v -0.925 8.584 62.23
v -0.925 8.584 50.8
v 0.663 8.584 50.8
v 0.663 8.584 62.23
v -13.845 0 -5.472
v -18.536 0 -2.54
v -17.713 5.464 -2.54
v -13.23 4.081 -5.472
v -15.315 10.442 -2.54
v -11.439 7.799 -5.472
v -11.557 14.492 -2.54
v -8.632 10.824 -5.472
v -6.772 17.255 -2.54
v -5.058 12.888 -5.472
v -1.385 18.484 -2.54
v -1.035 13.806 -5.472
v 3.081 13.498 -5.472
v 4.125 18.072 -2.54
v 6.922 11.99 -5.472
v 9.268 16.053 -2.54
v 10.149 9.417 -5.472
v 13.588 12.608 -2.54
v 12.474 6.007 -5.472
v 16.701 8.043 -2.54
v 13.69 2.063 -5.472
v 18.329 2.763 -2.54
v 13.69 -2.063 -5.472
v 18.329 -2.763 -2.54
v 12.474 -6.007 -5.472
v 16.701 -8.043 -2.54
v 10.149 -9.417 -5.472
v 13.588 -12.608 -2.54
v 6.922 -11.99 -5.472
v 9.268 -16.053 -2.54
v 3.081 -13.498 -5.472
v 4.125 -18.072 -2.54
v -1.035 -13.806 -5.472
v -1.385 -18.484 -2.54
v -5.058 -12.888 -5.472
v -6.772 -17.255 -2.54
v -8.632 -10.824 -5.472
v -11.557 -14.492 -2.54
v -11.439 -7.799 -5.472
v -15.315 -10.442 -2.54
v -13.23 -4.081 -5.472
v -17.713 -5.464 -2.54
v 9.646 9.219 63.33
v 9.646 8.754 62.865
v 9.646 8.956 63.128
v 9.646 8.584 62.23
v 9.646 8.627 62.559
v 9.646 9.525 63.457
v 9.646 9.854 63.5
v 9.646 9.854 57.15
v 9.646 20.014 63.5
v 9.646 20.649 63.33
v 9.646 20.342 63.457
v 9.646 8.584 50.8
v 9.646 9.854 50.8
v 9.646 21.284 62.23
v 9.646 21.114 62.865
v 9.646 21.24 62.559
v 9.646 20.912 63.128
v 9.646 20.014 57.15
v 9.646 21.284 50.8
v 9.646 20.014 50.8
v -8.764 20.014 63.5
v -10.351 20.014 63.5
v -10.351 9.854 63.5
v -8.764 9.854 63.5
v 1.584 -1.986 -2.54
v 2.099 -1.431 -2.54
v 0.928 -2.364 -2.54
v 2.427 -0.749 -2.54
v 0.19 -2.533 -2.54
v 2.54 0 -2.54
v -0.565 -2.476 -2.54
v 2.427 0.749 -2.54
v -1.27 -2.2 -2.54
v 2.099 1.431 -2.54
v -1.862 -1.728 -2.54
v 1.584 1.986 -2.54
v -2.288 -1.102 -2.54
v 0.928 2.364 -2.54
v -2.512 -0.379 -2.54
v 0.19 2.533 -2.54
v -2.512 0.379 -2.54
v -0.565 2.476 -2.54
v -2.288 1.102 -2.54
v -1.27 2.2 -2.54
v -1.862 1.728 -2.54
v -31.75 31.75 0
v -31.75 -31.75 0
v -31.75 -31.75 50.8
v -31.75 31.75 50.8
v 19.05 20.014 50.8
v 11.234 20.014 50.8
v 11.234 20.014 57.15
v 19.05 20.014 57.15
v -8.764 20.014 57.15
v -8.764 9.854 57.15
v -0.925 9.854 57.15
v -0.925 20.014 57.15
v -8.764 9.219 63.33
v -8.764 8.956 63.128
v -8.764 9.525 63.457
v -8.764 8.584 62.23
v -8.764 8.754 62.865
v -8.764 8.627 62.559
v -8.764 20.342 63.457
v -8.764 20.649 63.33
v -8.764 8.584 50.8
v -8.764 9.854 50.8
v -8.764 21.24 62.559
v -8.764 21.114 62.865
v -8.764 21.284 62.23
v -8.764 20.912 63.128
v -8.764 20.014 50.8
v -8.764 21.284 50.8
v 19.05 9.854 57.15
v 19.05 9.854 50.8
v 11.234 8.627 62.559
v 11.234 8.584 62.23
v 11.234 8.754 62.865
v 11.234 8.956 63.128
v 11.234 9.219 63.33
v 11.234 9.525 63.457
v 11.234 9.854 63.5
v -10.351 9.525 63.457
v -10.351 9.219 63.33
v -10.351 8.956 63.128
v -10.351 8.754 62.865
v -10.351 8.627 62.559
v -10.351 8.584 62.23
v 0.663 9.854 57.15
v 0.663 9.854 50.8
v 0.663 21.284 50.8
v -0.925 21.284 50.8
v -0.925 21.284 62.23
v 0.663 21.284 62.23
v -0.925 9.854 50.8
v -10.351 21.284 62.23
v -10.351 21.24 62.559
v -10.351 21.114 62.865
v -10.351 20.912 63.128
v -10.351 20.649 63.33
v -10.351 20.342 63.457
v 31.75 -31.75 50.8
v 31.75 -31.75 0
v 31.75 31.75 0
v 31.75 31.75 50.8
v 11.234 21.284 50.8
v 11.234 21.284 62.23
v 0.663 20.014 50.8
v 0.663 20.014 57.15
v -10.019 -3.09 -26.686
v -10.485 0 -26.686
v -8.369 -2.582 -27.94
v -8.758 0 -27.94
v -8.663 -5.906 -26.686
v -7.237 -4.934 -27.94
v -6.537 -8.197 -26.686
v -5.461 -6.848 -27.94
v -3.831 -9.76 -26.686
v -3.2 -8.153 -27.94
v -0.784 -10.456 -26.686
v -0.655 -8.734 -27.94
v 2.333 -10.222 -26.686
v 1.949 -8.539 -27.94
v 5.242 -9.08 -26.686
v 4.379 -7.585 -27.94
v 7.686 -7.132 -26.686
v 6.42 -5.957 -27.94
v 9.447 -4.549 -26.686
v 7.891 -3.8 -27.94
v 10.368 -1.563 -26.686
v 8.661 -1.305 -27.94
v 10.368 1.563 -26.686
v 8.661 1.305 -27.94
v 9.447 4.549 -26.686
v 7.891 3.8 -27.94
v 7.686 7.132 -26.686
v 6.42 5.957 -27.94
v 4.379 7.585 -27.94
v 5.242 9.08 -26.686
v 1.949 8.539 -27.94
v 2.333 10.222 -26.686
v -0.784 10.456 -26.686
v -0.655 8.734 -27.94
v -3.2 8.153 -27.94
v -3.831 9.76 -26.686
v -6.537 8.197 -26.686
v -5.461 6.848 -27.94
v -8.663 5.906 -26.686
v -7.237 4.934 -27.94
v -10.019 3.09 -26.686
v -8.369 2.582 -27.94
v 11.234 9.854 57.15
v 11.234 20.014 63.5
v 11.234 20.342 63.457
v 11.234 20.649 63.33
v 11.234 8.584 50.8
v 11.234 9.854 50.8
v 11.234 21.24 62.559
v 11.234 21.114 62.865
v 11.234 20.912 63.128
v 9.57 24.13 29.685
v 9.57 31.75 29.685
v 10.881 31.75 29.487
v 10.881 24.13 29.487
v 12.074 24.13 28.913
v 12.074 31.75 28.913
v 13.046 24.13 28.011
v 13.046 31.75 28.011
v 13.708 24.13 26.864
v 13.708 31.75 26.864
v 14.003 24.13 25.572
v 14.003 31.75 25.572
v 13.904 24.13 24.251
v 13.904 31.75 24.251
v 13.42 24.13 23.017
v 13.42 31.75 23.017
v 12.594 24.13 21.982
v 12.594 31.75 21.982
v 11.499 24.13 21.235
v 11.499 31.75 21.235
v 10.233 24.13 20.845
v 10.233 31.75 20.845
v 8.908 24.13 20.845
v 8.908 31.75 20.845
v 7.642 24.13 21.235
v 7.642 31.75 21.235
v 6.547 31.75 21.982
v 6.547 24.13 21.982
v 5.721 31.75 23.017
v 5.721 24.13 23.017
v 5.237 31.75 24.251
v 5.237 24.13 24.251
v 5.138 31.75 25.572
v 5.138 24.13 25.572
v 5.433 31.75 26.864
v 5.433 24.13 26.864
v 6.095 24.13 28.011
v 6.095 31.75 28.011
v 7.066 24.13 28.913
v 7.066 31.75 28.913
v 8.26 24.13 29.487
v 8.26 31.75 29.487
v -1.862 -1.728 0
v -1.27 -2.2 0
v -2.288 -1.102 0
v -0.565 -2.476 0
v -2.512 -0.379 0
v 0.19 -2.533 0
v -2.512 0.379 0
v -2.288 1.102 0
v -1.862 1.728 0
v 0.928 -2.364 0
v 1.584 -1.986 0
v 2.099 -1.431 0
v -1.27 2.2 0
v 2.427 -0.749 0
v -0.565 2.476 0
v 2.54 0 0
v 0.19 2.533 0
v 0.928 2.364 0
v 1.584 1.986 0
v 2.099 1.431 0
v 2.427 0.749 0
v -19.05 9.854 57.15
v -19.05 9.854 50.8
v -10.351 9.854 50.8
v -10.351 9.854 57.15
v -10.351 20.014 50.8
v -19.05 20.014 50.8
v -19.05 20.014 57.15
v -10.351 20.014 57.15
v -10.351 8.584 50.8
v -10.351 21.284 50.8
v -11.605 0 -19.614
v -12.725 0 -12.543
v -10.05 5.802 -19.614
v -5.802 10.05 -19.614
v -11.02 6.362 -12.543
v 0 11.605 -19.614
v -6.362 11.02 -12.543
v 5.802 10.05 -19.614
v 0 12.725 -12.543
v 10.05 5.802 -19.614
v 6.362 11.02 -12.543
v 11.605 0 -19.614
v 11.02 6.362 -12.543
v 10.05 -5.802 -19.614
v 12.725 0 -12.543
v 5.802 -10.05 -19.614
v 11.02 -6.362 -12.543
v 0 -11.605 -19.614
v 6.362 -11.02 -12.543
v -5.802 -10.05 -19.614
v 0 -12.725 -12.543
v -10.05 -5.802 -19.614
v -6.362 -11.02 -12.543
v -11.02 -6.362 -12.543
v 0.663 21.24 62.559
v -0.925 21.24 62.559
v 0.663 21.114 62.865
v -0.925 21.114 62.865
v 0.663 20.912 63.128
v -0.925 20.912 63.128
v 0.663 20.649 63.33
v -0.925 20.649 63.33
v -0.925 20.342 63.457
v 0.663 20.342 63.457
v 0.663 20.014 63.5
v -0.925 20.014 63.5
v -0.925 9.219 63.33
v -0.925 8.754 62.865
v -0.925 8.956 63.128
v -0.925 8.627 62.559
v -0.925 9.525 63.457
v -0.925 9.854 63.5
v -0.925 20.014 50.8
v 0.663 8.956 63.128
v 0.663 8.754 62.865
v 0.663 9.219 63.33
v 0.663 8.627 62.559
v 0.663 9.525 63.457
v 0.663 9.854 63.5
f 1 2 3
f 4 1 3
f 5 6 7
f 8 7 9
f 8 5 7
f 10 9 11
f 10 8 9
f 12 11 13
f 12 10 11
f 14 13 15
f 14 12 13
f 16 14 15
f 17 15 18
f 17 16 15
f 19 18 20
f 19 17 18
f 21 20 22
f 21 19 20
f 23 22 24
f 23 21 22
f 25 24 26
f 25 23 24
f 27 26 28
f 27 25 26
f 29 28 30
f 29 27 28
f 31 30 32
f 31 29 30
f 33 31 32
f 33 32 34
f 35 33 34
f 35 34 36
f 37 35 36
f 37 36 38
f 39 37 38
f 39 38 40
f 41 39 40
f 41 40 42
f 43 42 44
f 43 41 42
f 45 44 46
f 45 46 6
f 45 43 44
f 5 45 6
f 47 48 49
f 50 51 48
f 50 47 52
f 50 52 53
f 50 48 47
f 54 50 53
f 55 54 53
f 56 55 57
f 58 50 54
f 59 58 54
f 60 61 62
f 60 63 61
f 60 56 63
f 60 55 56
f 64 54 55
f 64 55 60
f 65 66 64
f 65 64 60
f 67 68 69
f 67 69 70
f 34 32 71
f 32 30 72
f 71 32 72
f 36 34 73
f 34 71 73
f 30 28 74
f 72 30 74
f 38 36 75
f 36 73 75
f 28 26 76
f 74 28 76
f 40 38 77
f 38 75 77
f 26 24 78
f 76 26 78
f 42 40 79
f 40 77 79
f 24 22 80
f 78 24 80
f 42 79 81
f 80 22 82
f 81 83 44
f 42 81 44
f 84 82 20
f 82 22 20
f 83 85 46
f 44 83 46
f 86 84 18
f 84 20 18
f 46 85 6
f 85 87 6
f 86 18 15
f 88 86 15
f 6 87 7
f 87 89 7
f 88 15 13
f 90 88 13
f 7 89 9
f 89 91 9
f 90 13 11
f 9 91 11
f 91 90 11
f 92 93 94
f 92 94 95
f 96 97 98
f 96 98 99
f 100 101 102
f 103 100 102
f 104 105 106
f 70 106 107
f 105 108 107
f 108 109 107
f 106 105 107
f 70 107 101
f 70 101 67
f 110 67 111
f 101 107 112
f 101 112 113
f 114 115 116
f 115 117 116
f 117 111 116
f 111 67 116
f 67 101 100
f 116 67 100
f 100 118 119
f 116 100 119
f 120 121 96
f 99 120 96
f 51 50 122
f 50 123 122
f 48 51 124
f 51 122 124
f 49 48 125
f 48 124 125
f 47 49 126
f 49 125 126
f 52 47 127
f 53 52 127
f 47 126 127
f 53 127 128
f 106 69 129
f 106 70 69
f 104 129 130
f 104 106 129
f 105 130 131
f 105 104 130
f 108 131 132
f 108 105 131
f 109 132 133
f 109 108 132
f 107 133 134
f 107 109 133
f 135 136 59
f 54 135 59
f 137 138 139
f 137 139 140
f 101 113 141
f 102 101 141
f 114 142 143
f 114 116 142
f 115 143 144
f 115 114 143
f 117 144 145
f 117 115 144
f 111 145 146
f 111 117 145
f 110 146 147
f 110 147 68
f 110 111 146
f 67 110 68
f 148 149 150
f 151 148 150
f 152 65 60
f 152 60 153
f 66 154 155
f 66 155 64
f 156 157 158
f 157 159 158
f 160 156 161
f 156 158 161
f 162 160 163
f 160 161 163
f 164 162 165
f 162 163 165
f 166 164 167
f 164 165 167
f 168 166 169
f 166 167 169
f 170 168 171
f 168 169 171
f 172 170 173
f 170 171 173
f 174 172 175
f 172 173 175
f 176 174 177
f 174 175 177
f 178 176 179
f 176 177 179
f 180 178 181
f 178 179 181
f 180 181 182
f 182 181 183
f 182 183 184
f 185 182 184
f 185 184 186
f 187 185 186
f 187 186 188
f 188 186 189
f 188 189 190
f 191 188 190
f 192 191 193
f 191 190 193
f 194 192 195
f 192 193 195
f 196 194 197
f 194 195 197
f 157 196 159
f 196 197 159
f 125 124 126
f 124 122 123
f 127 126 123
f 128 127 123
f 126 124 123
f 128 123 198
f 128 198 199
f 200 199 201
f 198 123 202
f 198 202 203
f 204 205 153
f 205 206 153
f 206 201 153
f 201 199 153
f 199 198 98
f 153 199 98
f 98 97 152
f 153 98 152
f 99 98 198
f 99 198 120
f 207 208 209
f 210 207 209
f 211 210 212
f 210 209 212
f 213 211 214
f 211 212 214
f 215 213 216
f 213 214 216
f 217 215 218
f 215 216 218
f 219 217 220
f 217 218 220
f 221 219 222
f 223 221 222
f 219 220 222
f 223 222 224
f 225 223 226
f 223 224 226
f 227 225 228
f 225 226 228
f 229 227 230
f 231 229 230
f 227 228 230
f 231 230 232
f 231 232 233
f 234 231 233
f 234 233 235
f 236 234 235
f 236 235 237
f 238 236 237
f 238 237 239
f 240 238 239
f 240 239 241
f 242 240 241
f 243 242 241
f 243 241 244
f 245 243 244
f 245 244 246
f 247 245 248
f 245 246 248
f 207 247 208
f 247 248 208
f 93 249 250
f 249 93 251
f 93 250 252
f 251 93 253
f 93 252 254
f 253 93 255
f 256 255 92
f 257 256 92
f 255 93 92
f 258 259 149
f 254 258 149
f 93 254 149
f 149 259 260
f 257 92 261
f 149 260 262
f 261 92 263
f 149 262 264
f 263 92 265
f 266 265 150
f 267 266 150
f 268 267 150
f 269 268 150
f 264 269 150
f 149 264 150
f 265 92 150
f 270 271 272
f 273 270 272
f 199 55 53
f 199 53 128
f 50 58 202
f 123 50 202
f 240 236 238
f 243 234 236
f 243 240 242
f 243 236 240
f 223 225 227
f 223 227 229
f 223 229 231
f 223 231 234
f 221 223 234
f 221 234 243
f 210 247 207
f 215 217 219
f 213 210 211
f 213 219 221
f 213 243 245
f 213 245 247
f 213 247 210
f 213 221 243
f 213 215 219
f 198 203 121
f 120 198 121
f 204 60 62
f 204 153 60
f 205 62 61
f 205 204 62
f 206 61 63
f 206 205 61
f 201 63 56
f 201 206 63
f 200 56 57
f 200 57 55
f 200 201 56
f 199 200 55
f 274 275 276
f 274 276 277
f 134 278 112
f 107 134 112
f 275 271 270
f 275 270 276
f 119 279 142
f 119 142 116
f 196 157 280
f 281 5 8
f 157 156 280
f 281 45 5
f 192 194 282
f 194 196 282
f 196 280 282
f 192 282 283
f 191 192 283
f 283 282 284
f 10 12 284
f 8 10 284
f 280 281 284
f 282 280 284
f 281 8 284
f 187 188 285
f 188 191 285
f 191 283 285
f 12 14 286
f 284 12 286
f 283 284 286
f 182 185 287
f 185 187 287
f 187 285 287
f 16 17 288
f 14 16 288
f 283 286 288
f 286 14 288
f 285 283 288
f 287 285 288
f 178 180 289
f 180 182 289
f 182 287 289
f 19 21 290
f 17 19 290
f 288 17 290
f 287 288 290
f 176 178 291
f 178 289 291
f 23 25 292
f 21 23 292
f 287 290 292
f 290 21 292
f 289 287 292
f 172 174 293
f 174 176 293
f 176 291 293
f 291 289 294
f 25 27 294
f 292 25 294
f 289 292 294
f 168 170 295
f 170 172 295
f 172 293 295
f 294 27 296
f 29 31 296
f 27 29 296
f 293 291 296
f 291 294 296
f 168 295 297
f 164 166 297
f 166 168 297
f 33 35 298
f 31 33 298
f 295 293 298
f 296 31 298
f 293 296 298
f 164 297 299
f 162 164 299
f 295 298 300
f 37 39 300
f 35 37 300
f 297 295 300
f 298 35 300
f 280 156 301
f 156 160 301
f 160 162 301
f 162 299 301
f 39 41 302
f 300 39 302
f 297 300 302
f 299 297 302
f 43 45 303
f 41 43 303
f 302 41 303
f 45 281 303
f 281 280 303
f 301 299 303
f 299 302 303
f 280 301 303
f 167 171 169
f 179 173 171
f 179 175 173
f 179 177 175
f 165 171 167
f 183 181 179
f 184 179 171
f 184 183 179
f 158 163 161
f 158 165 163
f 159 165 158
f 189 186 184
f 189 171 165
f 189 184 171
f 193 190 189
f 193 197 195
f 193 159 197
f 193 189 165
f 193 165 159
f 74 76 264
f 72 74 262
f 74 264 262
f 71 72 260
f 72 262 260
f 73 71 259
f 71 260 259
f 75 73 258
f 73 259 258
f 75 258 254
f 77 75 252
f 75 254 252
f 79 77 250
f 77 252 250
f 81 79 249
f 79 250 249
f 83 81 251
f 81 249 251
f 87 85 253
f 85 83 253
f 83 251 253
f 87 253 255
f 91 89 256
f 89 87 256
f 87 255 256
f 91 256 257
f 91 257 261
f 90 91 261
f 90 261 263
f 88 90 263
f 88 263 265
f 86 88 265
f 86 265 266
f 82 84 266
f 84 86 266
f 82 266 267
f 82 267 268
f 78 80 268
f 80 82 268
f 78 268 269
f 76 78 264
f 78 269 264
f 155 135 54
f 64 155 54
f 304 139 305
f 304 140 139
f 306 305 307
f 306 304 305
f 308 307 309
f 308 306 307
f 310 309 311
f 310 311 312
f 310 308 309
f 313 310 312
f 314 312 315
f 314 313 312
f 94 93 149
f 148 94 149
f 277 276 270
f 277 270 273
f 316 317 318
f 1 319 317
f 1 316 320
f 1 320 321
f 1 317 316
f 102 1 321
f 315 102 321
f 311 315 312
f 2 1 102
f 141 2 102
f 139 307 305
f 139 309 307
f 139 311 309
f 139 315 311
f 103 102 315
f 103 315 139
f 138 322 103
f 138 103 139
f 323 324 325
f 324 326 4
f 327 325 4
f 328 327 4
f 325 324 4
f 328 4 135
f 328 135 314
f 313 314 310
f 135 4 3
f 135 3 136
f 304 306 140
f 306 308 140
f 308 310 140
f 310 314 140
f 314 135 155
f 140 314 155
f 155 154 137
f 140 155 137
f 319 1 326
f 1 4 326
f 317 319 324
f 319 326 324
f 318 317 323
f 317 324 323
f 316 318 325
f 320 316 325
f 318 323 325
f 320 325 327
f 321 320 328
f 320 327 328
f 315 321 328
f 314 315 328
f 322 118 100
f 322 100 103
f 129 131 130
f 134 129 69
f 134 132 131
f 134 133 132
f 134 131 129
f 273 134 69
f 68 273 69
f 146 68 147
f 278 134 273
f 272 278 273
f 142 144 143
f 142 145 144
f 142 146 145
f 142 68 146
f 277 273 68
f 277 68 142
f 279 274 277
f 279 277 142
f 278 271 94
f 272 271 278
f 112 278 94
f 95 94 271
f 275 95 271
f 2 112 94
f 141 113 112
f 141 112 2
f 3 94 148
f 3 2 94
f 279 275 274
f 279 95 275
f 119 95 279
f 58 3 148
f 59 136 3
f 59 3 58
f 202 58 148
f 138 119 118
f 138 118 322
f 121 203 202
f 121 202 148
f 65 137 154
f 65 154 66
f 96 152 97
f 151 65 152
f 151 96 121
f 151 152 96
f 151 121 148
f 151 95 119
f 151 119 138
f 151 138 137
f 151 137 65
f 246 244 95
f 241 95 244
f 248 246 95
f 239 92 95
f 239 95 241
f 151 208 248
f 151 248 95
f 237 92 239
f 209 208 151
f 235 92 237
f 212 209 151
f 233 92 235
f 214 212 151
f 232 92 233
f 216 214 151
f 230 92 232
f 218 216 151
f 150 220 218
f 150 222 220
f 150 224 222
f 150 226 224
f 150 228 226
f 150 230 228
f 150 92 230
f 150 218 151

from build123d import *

# Parameters (mm, degrees)
SKETCH1_W                     = 63.5
SKETCH1_H                     = 63.5
BOSS_EXTRUDE1_DEPTH           = 50.8
SKETCH2_R                     = 2.54
BOSS_EXTRUDE2_DEPTH           = 12.7
SKETCH3_R                     = 12.7
BOSS_EXTRUDE3_DEPTH           = 15.24
BOSS_EXTRUDE3_TAPER           = 9
BOSS_EXTRUDE3_OTHER_WAY_DEPTH = 10.16
BOSS_EXTRUDE3_OTHER_WAY_TAPER = -9
BOSS_EXTRUDE4_START           = -25.4
SKETCH4_R                     = 18.536300075
BOSS_EXTRUDE4_DEPTH           = 3.175
BOSS_EXTRUDE4_TAPER           = 58
CHAMFER1_SIZE                 = 1.27
CHAMFER1_SIZE_2               = 1.527812426
SKETCH6_W                     = 38.1
SKETCH6_H                     = 10.16
BOSS_EXTRUDE6_DEPTH           = 6.35
BOSS_EXTRUDE7_DEPTH           = 6.35
BOSS_EXTRUDE7_DEPTH_BACK      = 6.35
SKETCH7_W                     = 1.5875
SKETCH7_H                     = 12.7
FILLET1_R                     = 1.27
SKETCH8_R                     = 4.445
CUT_EXTRUDE1_DEPTH            = 7.62


with BuildPart() as part:
    # Sketch1 → Boss-Extrude1 (new body)
    with BuildSketch(Plane.XY):
        Rectangle(SKETCH1_W, SKETCH1_H)
    extrude(amount=BOSS_EXTRUDE1_DEPTH)

    # Sketch2 → Boss-Extrude2 (add)
    with BuildSketch(Plane(origin=(0, 0, 0), x_dir=(-1, 0, 0), z_dir=(0, 0, -1))):
        with Locations(Location((0, 0, 0), (0, 0, 180))):
            Circle(SKETCH2_R)
    extrude(amount=BOSS_EXTRUDE2_DEPTH)

    # Sketch3 → Boss-Extrude3 (add)
    with BuildSketch(Plane(origin=(0, 0, -12.7), x_dir=(-1, 0, 0), z_dir=(0, 0, -1))):
        Circle(SKETCH3_R)
    extrude(amount=BOSS_EXTRUDE3_DEPTH, taper=BOSS_EXTRUDE3_TAPER)

    # Sketch3 → Boss-Extrude3 other way (add)
    with BuildSketch(Plane(origin=(0, 0, -12.7), x_dir=(-1, 0, 0), z_dir=(0, 0, -1))):
        Circle(SKETCH3_R)
    extrude(amount=-BOSS_EXTRUDE3_OTHER_WAY_DEPTH, taper=BOSS_EXTRUDE3_OTHER_WAY_TAPER)

    # Sketch4 → Boss-Extrude4 (add)
    with BuildSketch(Plane(origin=(0, 0, -27.94), x_dir=(-1, 0, 0), z_dir=(0, 0, -1)).offset(BOSS_EXTRUDE4_START)):
        Circle(SKETCH4_R)
    extrude(amount=BOSS_EXTRUDE4_DEPTH, taper=BOSS_EXTRUDE4_TAPER)

    # Chamfer1
    # the kernel refuses this chamfer: 1.527812426, 1.27 mm, written as the material it takes off along each edge
    with BuildSketch(Plane(origin=(0, 0, -27.94), x_dir=(-1, 0, 0), z_dir=(0, 1, 0))) as chamfer1_piece_1:
        Polygon((10.286221129 + CHAMFER1_SIZE * 0.15643446504, CHAMFER1_SIZE * 0.987688340595), (10.286221129 - CHAMFER1_SIZE_2, 0), (10.286221129, 0), align=None)
    revolve(axis=Axis((0, 0, -27.94), (0, 0, 1)), mode=Mode.SUBTRACT)

    # Sketch6 → Boss-Extrude6 (add)
    with BuildSketch(Plane.XY.offset(50.8)):
        with Locations((0, 14.933737581)):
            Rectangle(SKETCH6_W, SKETCH6_H)
    extrude(amount=BOSS_EXTRUDE6_DEPTH)

    # Sketch7 → Boss-Extrude7 (add, two sides: drawn at the far end of the back side and taken through both)
    with BuildSketch(Plane.XY.offset(57.15).offset(-BOSS_EXTRUDE7_DEPTH_BACK)):
        with Locations((-9.557292348, 14.933737581)):
            Rectangle(SKETCH7_W, SKETCH7_H)
        with Locations((-0.131236763, 14.933737581)):
            Rectangle(SKETCH7_W, SKETCH7_H)
        with Locations((10.440040529, 14.933737581)):
            Rectangle(SKETCH7_W, SKETCH7_H)
    extrude(amount=BOSS_EXTRUDE7_DEPTH + BOSS_EXTRUDE7_DEPTH_BACK)

    # Fillet1
    fillet1_edges = [part.edges().sort_by_distance(p)[0] for p in [
        (10.440040529, 21.283737581, 63.5),
        (10.440040529, 8.583737581, 63.5),
        (-0.131236763, 21.283737581, 63.5),
        (-0.131236763, 8.583737581, 63.5),
        (-9.557292348, 21.283737581, 63.5),
        (-9.557292348, 8.583737581, 63.5),
    ]]
    fillet(fillet1_edges, radius=FILLET1_R)

    # Sketch8 → Cut-Extrude1 (cut)
    with BuildSketch(Plane(origin=(0, 31.75, 0), x_dir=(1, 0, 0), z_dir=(0, 1, 0))):
        with Locations(Location((9.570348057, -25.239963614, 0), (0, 0, 270))):
            Circle(SKETCH8_R)
    extrude(amount=-CUT_EXTRUDE1_DEPTH, mode=Mode.SUBTRACT)


solid = part.part
